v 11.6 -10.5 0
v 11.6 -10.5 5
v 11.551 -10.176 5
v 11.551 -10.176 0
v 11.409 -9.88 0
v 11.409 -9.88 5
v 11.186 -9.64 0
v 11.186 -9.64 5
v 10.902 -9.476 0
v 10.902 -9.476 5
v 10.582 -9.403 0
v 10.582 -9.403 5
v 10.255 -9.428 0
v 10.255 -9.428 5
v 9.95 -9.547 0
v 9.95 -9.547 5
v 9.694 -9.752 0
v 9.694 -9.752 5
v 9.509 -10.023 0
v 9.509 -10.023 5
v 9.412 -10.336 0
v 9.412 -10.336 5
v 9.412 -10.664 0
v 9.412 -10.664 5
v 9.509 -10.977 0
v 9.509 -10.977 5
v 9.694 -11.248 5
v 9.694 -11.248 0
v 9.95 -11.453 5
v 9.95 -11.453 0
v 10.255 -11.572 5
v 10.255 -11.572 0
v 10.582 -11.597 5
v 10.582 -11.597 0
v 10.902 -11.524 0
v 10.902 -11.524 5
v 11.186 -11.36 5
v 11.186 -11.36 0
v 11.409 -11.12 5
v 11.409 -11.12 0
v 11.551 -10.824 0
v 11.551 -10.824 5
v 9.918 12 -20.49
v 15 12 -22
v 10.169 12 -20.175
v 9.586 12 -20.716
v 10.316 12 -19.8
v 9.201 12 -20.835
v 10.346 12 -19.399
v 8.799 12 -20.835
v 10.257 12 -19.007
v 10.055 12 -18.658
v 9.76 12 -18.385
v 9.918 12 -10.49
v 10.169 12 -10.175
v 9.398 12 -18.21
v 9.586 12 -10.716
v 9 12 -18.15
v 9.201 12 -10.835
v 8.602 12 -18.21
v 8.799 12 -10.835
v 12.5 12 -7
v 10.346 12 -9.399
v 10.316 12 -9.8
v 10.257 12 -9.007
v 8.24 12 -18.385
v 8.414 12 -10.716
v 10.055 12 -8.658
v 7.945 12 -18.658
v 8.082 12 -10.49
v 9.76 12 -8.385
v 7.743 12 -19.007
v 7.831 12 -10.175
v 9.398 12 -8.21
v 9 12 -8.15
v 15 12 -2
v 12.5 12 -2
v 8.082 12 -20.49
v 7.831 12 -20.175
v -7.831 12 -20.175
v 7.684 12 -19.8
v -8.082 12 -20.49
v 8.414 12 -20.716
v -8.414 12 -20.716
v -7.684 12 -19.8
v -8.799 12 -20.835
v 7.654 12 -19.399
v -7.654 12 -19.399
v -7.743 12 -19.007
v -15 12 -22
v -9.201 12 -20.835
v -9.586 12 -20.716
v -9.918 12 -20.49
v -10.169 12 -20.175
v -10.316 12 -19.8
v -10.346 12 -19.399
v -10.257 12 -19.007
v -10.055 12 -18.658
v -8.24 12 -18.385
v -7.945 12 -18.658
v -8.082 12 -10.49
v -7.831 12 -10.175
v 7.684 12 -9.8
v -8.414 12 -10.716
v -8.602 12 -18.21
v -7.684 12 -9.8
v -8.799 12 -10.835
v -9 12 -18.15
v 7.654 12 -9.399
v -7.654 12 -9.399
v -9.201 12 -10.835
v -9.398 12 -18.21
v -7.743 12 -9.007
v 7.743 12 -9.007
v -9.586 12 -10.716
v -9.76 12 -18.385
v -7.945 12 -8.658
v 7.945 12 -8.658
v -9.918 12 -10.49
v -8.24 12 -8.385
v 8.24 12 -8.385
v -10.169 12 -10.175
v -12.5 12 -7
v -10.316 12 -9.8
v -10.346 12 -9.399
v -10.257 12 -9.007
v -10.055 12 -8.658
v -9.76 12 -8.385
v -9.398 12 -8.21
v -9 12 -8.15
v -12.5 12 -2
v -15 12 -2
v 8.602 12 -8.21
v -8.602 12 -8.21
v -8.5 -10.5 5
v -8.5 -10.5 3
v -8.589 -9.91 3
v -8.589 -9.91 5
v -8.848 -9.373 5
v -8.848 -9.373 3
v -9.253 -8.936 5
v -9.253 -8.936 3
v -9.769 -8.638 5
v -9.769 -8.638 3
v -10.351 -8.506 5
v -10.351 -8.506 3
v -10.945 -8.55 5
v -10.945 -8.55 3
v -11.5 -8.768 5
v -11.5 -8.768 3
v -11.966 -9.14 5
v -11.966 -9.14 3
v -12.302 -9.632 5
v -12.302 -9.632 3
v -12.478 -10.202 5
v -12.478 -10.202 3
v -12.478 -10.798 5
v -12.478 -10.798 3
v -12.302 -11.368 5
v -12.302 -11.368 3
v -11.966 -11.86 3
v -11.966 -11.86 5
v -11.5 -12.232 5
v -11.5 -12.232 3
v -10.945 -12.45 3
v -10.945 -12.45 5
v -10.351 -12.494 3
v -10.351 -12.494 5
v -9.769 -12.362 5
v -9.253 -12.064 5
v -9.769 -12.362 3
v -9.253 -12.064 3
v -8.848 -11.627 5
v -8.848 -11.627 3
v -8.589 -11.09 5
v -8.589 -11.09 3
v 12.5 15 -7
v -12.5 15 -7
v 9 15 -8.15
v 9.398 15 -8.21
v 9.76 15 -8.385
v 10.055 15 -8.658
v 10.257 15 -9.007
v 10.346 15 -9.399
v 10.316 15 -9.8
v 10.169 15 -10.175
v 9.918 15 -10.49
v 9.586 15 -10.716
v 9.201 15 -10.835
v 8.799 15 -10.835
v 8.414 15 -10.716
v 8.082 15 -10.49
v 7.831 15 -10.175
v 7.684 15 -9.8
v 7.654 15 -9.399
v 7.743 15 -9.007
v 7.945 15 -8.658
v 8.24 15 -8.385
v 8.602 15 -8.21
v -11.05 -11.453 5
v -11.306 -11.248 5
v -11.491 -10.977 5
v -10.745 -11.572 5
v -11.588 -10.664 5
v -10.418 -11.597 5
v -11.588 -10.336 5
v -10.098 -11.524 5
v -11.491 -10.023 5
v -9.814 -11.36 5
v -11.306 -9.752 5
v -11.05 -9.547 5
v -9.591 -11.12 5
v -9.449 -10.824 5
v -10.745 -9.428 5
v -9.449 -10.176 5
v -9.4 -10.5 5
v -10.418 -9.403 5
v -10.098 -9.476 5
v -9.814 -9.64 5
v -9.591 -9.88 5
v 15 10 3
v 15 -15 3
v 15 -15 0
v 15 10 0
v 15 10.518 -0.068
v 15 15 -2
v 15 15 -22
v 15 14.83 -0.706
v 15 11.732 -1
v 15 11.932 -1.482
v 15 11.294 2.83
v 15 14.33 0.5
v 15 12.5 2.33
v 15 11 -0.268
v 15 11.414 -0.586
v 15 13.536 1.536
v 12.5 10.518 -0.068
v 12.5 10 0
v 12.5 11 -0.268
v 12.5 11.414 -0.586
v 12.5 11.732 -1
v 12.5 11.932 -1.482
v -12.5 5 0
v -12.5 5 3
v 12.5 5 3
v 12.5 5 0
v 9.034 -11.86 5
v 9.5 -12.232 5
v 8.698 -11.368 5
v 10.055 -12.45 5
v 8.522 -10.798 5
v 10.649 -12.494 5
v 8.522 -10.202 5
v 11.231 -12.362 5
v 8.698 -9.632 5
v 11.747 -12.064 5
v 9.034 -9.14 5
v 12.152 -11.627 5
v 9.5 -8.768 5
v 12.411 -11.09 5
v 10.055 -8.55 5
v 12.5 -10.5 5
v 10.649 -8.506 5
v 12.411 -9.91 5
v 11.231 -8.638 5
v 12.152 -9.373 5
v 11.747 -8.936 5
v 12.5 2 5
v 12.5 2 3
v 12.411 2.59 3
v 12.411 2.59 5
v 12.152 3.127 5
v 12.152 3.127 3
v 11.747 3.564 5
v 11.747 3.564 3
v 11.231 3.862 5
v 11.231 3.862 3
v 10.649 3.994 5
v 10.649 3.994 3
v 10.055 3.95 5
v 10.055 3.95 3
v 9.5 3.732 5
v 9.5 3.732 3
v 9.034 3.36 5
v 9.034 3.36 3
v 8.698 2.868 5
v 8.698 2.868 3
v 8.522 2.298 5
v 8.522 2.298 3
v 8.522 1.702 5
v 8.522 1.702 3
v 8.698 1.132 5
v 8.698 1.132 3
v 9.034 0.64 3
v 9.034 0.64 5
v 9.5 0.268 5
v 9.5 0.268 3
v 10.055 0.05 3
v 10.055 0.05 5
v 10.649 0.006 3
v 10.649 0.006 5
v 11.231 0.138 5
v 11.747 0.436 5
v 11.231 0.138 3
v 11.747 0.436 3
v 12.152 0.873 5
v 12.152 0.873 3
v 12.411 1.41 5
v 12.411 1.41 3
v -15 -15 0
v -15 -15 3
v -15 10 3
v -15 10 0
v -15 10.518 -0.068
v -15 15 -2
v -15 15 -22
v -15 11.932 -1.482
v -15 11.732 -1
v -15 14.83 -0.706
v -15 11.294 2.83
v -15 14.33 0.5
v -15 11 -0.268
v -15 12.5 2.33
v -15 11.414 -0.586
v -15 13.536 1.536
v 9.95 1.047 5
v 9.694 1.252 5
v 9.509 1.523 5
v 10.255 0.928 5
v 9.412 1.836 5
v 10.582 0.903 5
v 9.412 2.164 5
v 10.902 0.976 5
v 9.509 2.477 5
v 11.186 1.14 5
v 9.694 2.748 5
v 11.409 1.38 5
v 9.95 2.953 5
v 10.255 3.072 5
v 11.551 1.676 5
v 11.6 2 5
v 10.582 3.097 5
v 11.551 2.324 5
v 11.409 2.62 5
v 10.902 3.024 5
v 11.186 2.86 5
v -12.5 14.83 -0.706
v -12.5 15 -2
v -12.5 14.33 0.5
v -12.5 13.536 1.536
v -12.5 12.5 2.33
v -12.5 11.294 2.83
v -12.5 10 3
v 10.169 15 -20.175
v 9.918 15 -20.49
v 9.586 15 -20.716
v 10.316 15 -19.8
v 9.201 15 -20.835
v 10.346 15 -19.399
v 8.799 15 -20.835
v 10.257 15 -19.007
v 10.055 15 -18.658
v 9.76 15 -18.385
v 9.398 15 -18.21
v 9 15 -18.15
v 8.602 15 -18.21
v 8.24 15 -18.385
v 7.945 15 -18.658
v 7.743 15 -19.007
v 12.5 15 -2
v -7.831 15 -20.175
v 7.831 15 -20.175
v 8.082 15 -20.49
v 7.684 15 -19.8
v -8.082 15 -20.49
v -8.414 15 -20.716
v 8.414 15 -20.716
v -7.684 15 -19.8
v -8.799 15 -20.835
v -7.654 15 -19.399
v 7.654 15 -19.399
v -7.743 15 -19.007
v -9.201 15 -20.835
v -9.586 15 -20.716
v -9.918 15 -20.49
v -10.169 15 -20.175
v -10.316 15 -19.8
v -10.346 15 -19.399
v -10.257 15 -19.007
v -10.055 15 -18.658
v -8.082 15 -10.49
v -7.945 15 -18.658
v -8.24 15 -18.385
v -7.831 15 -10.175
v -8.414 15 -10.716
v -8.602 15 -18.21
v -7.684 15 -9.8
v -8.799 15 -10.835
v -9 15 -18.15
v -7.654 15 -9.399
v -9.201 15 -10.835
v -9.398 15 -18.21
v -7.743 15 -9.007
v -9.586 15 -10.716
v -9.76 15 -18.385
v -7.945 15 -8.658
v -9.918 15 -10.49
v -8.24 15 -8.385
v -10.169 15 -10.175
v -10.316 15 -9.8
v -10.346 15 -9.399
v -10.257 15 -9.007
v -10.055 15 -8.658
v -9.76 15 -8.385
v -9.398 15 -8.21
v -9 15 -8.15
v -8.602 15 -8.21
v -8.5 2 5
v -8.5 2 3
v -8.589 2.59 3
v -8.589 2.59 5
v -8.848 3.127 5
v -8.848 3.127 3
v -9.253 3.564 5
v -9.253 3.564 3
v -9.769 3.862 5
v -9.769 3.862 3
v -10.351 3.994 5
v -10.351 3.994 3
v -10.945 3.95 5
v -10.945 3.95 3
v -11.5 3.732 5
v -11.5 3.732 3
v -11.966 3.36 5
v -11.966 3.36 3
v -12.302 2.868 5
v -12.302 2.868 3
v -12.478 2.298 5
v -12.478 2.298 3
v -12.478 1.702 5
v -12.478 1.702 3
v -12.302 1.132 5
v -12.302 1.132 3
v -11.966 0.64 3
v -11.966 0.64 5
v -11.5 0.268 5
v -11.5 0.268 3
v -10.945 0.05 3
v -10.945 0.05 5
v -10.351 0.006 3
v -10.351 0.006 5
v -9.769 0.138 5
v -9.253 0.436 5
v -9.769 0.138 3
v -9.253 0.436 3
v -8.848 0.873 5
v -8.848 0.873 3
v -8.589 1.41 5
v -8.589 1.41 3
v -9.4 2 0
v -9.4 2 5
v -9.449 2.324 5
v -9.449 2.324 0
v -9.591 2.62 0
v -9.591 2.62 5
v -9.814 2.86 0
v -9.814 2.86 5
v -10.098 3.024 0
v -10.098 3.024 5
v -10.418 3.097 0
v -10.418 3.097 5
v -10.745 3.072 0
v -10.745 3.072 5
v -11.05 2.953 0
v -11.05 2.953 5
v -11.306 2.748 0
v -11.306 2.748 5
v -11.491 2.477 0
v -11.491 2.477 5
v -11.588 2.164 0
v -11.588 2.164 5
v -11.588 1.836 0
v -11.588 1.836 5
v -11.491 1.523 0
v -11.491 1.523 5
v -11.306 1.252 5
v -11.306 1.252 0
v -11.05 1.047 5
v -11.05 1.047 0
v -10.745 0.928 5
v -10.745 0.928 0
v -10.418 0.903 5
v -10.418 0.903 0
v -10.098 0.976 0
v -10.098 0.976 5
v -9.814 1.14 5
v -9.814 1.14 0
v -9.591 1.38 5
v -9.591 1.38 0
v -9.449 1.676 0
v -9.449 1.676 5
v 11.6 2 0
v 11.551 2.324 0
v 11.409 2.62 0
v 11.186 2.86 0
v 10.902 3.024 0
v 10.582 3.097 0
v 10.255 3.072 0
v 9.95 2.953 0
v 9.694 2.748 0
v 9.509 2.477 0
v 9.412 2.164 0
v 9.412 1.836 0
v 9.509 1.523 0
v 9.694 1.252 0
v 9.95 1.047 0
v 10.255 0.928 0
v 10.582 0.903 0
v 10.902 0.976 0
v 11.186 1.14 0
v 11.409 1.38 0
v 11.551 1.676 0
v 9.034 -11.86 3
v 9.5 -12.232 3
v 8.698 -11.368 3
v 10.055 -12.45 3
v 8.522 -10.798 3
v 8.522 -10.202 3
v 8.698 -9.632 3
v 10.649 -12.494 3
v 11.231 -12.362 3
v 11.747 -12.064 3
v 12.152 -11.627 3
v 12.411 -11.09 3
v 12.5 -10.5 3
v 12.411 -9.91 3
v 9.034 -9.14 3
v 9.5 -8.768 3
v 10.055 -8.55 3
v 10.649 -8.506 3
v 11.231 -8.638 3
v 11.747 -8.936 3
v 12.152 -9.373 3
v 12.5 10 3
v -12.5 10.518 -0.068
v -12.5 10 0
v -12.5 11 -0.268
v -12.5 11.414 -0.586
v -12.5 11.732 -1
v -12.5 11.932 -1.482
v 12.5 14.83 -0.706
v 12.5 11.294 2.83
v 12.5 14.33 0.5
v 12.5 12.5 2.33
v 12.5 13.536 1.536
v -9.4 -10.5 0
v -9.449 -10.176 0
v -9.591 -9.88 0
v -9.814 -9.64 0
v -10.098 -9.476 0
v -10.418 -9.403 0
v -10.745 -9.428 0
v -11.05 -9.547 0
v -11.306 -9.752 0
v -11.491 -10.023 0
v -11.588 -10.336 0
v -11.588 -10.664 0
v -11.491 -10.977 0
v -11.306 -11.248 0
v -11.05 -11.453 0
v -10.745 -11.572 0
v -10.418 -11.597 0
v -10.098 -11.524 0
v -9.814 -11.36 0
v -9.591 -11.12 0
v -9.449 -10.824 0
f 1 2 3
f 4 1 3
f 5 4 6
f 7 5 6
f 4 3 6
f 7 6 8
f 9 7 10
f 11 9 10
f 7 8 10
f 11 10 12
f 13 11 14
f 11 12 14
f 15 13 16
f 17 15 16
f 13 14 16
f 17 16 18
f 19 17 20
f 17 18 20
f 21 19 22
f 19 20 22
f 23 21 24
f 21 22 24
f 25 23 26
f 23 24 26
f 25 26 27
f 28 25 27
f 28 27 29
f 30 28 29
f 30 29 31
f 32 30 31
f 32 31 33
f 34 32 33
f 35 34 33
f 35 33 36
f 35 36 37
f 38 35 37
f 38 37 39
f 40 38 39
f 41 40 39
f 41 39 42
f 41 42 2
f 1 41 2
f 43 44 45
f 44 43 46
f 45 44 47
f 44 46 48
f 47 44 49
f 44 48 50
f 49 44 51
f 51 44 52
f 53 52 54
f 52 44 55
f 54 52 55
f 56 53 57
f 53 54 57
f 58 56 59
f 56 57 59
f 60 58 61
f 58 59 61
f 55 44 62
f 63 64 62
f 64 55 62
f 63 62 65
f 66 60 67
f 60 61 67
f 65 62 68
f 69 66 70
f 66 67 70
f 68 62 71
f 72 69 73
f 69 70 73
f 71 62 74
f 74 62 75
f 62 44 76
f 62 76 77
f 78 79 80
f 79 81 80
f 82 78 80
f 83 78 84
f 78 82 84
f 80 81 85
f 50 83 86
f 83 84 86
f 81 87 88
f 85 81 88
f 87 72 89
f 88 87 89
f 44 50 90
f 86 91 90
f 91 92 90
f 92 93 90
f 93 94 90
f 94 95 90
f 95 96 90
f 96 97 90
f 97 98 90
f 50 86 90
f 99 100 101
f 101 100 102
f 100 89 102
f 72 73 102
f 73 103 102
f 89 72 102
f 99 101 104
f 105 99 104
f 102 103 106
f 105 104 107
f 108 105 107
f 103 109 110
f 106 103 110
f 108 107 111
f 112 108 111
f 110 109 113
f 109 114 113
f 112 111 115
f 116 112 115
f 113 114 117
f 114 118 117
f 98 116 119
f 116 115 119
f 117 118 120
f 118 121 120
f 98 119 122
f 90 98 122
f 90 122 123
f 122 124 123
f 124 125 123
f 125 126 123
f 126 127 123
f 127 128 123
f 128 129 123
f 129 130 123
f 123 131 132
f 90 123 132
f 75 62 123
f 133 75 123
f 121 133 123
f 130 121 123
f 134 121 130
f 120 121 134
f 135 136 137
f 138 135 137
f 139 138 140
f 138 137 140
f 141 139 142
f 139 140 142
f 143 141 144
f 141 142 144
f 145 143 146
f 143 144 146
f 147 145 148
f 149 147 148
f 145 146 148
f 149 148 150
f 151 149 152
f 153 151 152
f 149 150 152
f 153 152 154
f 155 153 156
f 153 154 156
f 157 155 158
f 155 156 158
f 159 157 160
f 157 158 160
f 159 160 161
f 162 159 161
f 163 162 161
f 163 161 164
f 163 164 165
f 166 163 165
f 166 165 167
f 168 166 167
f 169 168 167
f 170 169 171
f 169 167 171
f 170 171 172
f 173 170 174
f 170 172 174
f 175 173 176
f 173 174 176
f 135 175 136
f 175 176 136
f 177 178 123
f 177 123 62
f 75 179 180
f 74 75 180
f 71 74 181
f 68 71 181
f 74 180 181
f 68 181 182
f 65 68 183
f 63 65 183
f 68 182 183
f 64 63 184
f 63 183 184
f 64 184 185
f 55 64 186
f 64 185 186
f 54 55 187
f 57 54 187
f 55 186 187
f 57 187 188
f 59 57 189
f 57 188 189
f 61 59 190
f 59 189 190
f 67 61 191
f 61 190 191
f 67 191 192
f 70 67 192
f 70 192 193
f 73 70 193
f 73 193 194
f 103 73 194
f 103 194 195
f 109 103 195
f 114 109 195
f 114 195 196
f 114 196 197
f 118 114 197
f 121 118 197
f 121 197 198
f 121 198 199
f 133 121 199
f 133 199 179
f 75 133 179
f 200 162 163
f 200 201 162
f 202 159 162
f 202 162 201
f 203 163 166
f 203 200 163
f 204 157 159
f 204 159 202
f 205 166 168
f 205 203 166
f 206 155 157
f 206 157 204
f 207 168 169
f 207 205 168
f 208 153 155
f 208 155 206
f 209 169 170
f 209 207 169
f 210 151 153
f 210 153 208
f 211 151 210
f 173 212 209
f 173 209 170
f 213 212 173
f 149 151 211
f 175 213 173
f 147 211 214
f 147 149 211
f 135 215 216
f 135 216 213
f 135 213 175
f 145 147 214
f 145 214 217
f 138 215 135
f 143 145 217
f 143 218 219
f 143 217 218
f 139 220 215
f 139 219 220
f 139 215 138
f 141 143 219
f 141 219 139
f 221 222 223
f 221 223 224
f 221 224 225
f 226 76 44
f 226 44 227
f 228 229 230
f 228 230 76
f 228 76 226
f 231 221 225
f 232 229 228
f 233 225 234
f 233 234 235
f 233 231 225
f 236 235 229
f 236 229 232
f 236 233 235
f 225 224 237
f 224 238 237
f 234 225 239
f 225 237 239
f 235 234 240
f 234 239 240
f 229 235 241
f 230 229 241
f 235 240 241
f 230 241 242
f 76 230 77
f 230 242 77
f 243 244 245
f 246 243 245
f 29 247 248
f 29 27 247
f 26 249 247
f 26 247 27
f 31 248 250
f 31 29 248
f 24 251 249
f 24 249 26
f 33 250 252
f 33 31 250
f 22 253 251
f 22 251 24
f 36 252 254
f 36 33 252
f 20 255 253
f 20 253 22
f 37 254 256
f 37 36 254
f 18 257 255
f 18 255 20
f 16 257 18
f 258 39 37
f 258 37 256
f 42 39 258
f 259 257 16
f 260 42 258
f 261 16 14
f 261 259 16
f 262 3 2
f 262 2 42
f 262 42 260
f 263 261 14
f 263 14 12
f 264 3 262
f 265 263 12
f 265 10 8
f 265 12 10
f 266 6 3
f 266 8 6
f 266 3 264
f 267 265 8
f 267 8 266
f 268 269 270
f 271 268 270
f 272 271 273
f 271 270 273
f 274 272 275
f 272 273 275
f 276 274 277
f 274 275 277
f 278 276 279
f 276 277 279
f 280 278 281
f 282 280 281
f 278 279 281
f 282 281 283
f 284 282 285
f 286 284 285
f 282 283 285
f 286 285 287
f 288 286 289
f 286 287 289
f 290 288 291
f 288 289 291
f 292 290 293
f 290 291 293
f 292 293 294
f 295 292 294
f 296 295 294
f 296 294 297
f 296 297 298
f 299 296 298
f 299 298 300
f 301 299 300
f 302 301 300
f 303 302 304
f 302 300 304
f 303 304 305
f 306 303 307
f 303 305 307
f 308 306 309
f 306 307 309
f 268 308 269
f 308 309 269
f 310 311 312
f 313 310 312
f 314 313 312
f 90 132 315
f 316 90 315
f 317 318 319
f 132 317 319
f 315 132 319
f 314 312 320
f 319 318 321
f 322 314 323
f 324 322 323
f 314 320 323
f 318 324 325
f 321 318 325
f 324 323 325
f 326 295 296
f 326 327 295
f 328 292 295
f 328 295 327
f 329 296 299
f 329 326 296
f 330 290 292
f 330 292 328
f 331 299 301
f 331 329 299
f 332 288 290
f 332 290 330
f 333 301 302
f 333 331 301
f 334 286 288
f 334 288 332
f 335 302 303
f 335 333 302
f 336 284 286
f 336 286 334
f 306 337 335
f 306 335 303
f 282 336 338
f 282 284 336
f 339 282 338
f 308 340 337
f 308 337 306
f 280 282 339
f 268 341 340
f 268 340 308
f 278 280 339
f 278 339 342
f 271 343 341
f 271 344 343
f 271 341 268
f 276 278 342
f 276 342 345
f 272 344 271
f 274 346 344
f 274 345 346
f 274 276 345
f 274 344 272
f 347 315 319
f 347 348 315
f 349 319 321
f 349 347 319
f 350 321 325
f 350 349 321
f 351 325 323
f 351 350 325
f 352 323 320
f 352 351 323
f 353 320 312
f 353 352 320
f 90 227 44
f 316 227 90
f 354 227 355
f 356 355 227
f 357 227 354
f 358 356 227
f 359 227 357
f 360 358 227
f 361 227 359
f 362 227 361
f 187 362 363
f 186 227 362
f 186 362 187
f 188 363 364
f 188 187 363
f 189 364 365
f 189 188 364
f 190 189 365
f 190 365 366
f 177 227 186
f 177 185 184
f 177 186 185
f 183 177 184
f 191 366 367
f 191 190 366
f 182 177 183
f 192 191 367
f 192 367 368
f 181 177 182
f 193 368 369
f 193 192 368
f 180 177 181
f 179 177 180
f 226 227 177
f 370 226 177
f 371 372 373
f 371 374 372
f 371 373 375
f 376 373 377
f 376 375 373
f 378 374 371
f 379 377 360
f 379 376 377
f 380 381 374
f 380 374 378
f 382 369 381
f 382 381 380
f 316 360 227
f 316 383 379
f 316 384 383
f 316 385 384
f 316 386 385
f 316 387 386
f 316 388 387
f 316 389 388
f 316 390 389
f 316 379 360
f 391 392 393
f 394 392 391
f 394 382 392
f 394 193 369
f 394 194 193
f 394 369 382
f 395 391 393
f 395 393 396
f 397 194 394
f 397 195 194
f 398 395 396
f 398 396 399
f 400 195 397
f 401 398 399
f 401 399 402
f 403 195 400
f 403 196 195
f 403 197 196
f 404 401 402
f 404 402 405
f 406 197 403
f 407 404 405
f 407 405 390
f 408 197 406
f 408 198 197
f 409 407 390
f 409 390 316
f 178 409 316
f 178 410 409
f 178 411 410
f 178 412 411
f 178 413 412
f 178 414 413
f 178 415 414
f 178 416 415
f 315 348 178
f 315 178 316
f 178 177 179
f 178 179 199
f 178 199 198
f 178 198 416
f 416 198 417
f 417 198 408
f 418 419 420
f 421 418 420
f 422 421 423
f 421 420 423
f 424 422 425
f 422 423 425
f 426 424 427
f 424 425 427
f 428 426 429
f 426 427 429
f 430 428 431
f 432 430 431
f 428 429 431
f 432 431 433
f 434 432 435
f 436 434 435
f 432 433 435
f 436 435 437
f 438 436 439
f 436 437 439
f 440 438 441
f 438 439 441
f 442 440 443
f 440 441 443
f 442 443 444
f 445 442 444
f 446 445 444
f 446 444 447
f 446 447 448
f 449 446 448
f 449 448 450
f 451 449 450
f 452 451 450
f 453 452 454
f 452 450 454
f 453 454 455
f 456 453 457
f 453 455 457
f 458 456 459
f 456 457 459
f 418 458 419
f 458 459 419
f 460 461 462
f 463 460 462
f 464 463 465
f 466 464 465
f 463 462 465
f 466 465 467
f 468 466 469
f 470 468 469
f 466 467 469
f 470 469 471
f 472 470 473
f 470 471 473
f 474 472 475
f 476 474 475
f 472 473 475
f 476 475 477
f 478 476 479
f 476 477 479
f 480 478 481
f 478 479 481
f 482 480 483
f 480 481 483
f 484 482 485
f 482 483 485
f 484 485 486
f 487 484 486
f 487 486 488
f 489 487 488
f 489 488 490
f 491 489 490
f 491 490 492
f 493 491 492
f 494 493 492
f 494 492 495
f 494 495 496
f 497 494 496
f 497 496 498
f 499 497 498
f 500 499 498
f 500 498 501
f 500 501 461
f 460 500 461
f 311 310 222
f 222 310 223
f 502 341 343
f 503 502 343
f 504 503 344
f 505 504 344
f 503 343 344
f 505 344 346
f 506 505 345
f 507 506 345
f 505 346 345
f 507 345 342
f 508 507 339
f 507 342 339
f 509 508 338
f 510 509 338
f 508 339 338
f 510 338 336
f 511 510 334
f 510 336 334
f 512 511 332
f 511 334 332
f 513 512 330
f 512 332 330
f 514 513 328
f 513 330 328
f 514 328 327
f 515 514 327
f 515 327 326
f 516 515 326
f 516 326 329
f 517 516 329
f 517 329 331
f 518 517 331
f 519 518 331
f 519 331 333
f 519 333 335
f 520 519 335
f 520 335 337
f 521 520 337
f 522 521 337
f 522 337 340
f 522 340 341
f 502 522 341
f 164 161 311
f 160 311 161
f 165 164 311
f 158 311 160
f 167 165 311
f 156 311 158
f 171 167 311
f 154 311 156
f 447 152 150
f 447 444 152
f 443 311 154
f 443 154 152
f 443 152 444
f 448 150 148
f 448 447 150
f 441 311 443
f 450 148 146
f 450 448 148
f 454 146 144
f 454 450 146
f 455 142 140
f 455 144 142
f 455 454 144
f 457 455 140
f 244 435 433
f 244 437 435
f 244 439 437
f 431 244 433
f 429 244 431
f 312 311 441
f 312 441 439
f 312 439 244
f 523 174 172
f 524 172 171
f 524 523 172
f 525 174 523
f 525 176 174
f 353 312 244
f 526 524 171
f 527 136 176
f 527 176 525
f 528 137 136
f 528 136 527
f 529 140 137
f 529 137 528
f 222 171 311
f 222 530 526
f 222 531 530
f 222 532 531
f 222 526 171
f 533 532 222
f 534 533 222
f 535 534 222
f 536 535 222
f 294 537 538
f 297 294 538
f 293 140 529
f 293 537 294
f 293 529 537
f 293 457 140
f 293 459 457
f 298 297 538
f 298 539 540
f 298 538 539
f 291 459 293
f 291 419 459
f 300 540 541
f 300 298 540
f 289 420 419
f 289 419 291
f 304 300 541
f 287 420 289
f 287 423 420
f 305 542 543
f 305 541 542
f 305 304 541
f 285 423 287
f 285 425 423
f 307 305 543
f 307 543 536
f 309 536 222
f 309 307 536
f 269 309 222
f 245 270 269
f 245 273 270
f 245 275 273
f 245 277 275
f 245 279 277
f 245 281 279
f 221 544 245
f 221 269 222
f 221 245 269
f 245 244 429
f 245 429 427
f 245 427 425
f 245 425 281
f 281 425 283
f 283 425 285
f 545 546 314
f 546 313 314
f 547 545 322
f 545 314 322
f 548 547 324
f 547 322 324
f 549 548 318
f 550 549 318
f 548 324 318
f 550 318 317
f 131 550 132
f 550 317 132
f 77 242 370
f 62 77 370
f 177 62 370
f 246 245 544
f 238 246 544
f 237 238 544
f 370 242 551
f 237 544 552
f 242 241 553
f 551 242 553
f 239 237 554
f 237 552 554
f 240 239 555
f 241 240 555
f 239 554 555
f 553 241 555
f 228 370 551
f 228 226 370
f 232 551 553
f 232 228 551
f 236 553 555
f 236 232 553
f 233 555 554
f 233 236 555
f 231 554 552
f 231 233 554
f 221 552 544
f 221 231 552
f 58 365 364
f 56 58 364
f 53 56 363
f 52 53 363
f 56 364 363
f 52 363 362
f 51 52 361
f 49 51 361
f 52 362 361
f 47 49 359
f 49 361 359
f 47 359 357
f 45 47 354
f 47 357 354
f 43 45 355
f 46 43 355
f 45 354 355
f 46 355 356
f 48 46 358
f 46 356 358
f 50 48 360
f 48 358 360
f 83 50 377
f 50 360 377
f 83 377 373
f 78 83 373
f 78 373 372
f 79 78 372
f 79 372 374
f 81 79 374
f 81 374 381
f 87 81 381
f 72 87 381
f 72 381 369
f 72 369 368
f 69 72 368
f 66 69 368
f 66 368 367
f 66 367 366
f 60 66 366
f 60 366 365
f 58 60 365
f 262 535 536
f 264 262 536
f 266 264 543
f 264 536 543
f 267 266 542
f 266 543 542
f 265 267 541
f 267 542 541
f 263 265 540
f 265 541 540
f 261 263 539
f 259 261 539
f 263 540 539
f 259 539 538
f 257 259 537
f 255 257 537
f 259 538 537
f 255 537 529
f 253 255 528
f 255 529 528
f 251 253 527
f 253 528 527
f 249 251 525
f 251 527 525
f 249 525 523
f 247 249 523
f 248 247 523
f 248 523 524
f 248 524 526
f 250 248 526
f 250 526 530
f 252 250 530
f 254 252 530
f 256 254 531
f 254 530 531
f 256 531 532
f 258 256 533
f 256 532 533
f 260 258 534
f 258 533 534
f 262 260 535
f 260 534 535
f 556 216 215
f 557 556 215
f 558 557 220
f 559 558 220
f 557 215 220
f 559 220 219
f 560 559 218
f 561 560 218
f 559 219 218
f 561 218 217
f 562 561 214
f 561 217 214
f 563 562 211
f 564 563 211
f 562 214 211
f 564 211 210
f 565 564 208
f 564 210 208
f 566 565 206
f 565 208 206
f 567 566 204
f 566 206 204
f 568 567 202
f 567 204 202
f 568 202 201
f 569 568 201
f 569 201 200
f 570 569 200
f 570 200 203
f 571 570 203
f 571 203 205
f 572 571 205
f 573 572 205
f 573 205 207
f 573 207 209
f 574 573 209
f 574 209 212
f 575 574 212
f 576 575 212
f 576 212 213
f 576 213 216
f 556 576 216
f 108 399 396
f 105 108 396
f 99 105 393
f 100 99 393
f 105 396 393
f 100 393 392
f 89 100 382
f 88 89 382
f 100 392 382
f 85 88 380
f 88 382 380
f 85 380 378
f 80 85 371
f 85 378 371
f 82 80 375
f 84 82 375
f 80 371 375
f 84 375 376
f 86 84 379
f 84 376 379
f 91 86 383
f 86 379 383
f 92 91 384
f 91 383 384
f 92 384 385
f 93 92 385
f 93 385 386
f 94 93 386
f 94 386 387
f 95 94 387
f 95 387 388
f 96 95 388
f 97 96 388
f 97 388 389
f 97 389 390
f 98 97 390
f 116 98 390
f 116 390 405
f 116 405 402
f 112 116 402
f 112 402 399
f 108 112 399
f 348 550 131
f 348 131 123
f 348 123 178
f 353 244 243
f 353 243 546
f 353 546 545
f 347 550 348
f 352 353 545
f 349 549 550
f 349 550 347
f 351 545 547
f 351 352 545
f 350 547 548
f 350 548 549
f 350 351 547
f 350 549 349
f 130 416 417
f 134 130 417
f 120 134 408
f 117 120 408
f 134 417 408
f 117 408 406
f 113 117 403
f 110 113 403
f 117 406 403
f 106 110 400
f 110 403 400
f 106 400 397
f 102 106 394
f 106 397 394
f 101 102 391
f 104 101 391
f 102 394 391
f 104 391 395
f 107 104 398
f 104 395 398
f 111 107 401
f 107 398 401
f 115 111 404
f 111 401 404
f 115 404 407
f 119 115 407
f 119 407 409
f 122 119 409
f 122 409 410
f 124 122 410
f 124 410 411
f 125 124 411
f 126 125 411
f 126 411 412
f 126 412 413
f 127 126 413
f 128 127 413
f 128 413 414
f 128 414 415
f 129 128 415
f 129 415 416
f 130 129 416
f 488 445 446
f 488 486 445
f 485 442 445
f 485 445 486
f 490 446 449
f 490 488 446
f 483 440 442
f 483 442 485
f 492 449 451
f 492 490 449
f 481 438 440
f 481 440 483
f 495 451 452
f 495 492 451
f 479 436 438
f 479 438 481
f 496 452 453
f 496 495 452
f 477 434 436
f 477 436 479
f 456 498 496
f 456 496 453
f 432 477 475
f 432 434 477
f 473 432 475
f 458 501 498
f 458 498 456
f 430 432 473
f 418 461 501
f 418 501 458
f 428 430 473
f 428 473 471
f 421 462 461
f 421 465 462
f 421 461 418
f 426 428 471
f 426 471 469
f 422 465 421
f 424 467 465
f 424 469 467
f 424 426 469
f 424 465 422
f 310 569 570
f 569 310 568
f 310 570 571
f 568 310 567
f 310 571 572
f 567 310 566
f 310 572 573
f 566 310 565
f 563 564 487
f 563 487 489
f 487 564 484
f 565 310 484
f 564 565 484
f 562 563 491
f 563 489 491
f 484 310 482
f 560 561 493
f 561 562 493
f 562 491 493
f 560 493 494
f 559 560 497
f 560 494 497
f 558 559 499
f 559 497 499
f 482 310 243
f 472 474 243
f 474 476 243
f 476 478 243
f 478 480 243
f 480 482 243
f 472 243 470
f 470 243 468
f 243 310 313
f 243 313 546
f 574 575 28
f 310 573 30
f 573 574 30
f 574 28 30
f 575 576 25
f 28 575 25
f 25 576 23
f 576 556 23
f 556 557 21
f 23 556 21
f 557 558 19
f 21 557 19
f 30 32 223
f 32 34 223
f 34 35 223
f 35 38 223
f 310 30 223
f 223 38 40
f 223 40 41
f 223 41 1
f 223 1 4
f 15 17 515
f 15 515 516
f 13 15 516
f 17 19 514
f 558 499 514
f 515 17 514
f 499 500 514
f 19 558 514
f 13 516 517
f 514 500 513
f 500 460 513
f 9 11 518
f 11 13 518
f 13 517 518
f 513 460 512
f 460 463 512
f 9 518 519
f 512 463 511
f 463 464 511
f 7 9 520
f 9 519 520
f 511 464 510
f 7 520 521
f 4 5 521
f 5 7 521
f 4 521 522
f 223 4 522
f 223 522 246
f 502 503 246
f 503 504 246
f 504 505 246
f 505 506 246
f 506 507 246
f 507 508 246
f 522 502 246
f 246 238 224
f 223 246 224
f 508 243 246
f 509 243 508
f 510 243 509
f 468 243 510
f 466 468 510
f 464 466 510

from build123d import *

# Parameters (mm, degrees)
SKETCH2_W           = 30
SKETCH2_H           = 30
BOSS_EXTRUDE1_DEPTH = 3
SKETCH4_R           = 2
BOSS_EXTRUDE2_DEPTH = 2
SKETCH5_R           = 1.1
CUT_EXTRUDE1_DEPTH  = 12
SKETCH6_W           = 25
SKETCH6_H           = 7
CUT_EXTRUDE2_DEPTH  = 3
SKETCH9_W           = 30
SKETCH9_H           = 3
BOSS_EXTRUDE3_DEPTH = 22
SKETCH10_W          = 25
SKETCH10_H          = 3
CUT_EXTRUDE3_DEPTH  = 10
FILLET1_R           = 2
FILLET2_R           = 5
SKETCH11_R          = 1.35
CUT_EXTRUDE4_DEPTH  = 10


with BuildPart() as part:
    # Sketch2 → Boss-Extrude1 (new body)
    with BuildSketch(Plane.XY):
        Rectangle(SKETCH2_W, SKETCH2_H)
    extrude(amount=BOSS_EXTRUDE1_DEPTH)

    # Sketch4 → Boss-Extrude2 (add)
    with BuildSketch(Plane.XY.offset(3)):
        with Locations((-10.5, 2)):
            Circle(SKETCH4_R)
        with Locations((10.5, 2)):
            Circle(SKETCH4_R)
        with Locations((10.5, -10.5)):
            Circle(SKETCH4_R)
        with Locations((-10.5, -10.5)):
            Circle(SKETCH4_R)
    extrude(amount=BOSS_EXTRUDE2_DEPTH)

    # Sketch5 → Cut-Extrude1 (cut)
    with BuildSketch(Plane.XY.offset(5)):
        with Locations((10.5, 2)):
            Circle(SKETCH5_R)
        with Locations((-10.5, 2)):
            Circle(SKETCH5_R)
        with Locations((-10.5, -10.5)):
            Circle(SKETCH5_R)
        with Locations((10.5, -10.5)):
            Circle(SKETCH5_R)
    extrude(amount=-CUT_EXTRUDE1_DEPTH, mode=Mode.SUBTRACT)

    # Sketch6 → Cut-Extrude2 (cut)
    with BuildSketch(Plane.XY.offset(3)):
        with Locations((0, 8.5)):
            Rectangle(SKETCH6_W, SKETCH6_H)
    extrude(amount=-CUT_EXTRUDE2_DEPTH, mode=Mode.SUBTRACT)

    # Sketch9 → Boss-Extrude3 (add)
    with BuildSketch(Plane(origin=(0, 0, 0), x_dir=(-1, 0, 0), z_dir=(0, 0, -1))):
        with Locations((0, 13.5)):
            Rectangle(SKETCH9_W, SKETCH9_H)
    extrude(amount=BOSS_EXTRUDE3_DEPTH)

    # Sketch10 → Cut-Extrude3 (cut)
    with BuildSketch(Plane.XY.offset(3)):
        with Locations((0, 13.5)):
            Rectangle(SKETCH10_W, SKETCH10_H)
    extrude(amount=-CUT_EXTRUDE3_DEPTH, mode=Mode.SUBTRACT)

    # Fillet1
    fillet1_edges = [part.edges().sort_by_distance(p)[0] for p in [
        (-13.75, 12, 0),
        (13.75, 12, 0),
    ]]
    fillet(fillet1_edges, radius=FILLET1_R)

    # Fillet2
    fillet2_edges = [part.edges().sort_by_distance(p)[0] for p in [
        (-13.75, 15, 3),
        (13.75, 15, 3),
    ]]
    fillet(fillet2_edges, radius=FILLET2_R)

    # Sketch11 → Cut-Extrude4 (cut)
    with BuildSketch(Plane(origin=(0, 15, 0), x_dir=(1, 0, 0), z_dir=(0, 1, 0))):
        with Locations(Location((-9, 19.5, 0), (0, 0, 270))):
            Circle(SKETCH11_R)
        with Locations(Location((9, 19.5, 0), (0, 0, 270))):
            Circle(SKETCH11_R)
        with Locations(Location((-9, 9.5, 0), (0, 0, 270))):
            Circle(SKETCH11_R)
        with Locations(Location((9, 9.5, 0), (0, 0, 270))):
            Circle(SKETCH11_R)
    extrude(amount=-CUT_EXTRUDE4_DEPTH, mode=Mode.SUBTRACT)


solid = part.part
